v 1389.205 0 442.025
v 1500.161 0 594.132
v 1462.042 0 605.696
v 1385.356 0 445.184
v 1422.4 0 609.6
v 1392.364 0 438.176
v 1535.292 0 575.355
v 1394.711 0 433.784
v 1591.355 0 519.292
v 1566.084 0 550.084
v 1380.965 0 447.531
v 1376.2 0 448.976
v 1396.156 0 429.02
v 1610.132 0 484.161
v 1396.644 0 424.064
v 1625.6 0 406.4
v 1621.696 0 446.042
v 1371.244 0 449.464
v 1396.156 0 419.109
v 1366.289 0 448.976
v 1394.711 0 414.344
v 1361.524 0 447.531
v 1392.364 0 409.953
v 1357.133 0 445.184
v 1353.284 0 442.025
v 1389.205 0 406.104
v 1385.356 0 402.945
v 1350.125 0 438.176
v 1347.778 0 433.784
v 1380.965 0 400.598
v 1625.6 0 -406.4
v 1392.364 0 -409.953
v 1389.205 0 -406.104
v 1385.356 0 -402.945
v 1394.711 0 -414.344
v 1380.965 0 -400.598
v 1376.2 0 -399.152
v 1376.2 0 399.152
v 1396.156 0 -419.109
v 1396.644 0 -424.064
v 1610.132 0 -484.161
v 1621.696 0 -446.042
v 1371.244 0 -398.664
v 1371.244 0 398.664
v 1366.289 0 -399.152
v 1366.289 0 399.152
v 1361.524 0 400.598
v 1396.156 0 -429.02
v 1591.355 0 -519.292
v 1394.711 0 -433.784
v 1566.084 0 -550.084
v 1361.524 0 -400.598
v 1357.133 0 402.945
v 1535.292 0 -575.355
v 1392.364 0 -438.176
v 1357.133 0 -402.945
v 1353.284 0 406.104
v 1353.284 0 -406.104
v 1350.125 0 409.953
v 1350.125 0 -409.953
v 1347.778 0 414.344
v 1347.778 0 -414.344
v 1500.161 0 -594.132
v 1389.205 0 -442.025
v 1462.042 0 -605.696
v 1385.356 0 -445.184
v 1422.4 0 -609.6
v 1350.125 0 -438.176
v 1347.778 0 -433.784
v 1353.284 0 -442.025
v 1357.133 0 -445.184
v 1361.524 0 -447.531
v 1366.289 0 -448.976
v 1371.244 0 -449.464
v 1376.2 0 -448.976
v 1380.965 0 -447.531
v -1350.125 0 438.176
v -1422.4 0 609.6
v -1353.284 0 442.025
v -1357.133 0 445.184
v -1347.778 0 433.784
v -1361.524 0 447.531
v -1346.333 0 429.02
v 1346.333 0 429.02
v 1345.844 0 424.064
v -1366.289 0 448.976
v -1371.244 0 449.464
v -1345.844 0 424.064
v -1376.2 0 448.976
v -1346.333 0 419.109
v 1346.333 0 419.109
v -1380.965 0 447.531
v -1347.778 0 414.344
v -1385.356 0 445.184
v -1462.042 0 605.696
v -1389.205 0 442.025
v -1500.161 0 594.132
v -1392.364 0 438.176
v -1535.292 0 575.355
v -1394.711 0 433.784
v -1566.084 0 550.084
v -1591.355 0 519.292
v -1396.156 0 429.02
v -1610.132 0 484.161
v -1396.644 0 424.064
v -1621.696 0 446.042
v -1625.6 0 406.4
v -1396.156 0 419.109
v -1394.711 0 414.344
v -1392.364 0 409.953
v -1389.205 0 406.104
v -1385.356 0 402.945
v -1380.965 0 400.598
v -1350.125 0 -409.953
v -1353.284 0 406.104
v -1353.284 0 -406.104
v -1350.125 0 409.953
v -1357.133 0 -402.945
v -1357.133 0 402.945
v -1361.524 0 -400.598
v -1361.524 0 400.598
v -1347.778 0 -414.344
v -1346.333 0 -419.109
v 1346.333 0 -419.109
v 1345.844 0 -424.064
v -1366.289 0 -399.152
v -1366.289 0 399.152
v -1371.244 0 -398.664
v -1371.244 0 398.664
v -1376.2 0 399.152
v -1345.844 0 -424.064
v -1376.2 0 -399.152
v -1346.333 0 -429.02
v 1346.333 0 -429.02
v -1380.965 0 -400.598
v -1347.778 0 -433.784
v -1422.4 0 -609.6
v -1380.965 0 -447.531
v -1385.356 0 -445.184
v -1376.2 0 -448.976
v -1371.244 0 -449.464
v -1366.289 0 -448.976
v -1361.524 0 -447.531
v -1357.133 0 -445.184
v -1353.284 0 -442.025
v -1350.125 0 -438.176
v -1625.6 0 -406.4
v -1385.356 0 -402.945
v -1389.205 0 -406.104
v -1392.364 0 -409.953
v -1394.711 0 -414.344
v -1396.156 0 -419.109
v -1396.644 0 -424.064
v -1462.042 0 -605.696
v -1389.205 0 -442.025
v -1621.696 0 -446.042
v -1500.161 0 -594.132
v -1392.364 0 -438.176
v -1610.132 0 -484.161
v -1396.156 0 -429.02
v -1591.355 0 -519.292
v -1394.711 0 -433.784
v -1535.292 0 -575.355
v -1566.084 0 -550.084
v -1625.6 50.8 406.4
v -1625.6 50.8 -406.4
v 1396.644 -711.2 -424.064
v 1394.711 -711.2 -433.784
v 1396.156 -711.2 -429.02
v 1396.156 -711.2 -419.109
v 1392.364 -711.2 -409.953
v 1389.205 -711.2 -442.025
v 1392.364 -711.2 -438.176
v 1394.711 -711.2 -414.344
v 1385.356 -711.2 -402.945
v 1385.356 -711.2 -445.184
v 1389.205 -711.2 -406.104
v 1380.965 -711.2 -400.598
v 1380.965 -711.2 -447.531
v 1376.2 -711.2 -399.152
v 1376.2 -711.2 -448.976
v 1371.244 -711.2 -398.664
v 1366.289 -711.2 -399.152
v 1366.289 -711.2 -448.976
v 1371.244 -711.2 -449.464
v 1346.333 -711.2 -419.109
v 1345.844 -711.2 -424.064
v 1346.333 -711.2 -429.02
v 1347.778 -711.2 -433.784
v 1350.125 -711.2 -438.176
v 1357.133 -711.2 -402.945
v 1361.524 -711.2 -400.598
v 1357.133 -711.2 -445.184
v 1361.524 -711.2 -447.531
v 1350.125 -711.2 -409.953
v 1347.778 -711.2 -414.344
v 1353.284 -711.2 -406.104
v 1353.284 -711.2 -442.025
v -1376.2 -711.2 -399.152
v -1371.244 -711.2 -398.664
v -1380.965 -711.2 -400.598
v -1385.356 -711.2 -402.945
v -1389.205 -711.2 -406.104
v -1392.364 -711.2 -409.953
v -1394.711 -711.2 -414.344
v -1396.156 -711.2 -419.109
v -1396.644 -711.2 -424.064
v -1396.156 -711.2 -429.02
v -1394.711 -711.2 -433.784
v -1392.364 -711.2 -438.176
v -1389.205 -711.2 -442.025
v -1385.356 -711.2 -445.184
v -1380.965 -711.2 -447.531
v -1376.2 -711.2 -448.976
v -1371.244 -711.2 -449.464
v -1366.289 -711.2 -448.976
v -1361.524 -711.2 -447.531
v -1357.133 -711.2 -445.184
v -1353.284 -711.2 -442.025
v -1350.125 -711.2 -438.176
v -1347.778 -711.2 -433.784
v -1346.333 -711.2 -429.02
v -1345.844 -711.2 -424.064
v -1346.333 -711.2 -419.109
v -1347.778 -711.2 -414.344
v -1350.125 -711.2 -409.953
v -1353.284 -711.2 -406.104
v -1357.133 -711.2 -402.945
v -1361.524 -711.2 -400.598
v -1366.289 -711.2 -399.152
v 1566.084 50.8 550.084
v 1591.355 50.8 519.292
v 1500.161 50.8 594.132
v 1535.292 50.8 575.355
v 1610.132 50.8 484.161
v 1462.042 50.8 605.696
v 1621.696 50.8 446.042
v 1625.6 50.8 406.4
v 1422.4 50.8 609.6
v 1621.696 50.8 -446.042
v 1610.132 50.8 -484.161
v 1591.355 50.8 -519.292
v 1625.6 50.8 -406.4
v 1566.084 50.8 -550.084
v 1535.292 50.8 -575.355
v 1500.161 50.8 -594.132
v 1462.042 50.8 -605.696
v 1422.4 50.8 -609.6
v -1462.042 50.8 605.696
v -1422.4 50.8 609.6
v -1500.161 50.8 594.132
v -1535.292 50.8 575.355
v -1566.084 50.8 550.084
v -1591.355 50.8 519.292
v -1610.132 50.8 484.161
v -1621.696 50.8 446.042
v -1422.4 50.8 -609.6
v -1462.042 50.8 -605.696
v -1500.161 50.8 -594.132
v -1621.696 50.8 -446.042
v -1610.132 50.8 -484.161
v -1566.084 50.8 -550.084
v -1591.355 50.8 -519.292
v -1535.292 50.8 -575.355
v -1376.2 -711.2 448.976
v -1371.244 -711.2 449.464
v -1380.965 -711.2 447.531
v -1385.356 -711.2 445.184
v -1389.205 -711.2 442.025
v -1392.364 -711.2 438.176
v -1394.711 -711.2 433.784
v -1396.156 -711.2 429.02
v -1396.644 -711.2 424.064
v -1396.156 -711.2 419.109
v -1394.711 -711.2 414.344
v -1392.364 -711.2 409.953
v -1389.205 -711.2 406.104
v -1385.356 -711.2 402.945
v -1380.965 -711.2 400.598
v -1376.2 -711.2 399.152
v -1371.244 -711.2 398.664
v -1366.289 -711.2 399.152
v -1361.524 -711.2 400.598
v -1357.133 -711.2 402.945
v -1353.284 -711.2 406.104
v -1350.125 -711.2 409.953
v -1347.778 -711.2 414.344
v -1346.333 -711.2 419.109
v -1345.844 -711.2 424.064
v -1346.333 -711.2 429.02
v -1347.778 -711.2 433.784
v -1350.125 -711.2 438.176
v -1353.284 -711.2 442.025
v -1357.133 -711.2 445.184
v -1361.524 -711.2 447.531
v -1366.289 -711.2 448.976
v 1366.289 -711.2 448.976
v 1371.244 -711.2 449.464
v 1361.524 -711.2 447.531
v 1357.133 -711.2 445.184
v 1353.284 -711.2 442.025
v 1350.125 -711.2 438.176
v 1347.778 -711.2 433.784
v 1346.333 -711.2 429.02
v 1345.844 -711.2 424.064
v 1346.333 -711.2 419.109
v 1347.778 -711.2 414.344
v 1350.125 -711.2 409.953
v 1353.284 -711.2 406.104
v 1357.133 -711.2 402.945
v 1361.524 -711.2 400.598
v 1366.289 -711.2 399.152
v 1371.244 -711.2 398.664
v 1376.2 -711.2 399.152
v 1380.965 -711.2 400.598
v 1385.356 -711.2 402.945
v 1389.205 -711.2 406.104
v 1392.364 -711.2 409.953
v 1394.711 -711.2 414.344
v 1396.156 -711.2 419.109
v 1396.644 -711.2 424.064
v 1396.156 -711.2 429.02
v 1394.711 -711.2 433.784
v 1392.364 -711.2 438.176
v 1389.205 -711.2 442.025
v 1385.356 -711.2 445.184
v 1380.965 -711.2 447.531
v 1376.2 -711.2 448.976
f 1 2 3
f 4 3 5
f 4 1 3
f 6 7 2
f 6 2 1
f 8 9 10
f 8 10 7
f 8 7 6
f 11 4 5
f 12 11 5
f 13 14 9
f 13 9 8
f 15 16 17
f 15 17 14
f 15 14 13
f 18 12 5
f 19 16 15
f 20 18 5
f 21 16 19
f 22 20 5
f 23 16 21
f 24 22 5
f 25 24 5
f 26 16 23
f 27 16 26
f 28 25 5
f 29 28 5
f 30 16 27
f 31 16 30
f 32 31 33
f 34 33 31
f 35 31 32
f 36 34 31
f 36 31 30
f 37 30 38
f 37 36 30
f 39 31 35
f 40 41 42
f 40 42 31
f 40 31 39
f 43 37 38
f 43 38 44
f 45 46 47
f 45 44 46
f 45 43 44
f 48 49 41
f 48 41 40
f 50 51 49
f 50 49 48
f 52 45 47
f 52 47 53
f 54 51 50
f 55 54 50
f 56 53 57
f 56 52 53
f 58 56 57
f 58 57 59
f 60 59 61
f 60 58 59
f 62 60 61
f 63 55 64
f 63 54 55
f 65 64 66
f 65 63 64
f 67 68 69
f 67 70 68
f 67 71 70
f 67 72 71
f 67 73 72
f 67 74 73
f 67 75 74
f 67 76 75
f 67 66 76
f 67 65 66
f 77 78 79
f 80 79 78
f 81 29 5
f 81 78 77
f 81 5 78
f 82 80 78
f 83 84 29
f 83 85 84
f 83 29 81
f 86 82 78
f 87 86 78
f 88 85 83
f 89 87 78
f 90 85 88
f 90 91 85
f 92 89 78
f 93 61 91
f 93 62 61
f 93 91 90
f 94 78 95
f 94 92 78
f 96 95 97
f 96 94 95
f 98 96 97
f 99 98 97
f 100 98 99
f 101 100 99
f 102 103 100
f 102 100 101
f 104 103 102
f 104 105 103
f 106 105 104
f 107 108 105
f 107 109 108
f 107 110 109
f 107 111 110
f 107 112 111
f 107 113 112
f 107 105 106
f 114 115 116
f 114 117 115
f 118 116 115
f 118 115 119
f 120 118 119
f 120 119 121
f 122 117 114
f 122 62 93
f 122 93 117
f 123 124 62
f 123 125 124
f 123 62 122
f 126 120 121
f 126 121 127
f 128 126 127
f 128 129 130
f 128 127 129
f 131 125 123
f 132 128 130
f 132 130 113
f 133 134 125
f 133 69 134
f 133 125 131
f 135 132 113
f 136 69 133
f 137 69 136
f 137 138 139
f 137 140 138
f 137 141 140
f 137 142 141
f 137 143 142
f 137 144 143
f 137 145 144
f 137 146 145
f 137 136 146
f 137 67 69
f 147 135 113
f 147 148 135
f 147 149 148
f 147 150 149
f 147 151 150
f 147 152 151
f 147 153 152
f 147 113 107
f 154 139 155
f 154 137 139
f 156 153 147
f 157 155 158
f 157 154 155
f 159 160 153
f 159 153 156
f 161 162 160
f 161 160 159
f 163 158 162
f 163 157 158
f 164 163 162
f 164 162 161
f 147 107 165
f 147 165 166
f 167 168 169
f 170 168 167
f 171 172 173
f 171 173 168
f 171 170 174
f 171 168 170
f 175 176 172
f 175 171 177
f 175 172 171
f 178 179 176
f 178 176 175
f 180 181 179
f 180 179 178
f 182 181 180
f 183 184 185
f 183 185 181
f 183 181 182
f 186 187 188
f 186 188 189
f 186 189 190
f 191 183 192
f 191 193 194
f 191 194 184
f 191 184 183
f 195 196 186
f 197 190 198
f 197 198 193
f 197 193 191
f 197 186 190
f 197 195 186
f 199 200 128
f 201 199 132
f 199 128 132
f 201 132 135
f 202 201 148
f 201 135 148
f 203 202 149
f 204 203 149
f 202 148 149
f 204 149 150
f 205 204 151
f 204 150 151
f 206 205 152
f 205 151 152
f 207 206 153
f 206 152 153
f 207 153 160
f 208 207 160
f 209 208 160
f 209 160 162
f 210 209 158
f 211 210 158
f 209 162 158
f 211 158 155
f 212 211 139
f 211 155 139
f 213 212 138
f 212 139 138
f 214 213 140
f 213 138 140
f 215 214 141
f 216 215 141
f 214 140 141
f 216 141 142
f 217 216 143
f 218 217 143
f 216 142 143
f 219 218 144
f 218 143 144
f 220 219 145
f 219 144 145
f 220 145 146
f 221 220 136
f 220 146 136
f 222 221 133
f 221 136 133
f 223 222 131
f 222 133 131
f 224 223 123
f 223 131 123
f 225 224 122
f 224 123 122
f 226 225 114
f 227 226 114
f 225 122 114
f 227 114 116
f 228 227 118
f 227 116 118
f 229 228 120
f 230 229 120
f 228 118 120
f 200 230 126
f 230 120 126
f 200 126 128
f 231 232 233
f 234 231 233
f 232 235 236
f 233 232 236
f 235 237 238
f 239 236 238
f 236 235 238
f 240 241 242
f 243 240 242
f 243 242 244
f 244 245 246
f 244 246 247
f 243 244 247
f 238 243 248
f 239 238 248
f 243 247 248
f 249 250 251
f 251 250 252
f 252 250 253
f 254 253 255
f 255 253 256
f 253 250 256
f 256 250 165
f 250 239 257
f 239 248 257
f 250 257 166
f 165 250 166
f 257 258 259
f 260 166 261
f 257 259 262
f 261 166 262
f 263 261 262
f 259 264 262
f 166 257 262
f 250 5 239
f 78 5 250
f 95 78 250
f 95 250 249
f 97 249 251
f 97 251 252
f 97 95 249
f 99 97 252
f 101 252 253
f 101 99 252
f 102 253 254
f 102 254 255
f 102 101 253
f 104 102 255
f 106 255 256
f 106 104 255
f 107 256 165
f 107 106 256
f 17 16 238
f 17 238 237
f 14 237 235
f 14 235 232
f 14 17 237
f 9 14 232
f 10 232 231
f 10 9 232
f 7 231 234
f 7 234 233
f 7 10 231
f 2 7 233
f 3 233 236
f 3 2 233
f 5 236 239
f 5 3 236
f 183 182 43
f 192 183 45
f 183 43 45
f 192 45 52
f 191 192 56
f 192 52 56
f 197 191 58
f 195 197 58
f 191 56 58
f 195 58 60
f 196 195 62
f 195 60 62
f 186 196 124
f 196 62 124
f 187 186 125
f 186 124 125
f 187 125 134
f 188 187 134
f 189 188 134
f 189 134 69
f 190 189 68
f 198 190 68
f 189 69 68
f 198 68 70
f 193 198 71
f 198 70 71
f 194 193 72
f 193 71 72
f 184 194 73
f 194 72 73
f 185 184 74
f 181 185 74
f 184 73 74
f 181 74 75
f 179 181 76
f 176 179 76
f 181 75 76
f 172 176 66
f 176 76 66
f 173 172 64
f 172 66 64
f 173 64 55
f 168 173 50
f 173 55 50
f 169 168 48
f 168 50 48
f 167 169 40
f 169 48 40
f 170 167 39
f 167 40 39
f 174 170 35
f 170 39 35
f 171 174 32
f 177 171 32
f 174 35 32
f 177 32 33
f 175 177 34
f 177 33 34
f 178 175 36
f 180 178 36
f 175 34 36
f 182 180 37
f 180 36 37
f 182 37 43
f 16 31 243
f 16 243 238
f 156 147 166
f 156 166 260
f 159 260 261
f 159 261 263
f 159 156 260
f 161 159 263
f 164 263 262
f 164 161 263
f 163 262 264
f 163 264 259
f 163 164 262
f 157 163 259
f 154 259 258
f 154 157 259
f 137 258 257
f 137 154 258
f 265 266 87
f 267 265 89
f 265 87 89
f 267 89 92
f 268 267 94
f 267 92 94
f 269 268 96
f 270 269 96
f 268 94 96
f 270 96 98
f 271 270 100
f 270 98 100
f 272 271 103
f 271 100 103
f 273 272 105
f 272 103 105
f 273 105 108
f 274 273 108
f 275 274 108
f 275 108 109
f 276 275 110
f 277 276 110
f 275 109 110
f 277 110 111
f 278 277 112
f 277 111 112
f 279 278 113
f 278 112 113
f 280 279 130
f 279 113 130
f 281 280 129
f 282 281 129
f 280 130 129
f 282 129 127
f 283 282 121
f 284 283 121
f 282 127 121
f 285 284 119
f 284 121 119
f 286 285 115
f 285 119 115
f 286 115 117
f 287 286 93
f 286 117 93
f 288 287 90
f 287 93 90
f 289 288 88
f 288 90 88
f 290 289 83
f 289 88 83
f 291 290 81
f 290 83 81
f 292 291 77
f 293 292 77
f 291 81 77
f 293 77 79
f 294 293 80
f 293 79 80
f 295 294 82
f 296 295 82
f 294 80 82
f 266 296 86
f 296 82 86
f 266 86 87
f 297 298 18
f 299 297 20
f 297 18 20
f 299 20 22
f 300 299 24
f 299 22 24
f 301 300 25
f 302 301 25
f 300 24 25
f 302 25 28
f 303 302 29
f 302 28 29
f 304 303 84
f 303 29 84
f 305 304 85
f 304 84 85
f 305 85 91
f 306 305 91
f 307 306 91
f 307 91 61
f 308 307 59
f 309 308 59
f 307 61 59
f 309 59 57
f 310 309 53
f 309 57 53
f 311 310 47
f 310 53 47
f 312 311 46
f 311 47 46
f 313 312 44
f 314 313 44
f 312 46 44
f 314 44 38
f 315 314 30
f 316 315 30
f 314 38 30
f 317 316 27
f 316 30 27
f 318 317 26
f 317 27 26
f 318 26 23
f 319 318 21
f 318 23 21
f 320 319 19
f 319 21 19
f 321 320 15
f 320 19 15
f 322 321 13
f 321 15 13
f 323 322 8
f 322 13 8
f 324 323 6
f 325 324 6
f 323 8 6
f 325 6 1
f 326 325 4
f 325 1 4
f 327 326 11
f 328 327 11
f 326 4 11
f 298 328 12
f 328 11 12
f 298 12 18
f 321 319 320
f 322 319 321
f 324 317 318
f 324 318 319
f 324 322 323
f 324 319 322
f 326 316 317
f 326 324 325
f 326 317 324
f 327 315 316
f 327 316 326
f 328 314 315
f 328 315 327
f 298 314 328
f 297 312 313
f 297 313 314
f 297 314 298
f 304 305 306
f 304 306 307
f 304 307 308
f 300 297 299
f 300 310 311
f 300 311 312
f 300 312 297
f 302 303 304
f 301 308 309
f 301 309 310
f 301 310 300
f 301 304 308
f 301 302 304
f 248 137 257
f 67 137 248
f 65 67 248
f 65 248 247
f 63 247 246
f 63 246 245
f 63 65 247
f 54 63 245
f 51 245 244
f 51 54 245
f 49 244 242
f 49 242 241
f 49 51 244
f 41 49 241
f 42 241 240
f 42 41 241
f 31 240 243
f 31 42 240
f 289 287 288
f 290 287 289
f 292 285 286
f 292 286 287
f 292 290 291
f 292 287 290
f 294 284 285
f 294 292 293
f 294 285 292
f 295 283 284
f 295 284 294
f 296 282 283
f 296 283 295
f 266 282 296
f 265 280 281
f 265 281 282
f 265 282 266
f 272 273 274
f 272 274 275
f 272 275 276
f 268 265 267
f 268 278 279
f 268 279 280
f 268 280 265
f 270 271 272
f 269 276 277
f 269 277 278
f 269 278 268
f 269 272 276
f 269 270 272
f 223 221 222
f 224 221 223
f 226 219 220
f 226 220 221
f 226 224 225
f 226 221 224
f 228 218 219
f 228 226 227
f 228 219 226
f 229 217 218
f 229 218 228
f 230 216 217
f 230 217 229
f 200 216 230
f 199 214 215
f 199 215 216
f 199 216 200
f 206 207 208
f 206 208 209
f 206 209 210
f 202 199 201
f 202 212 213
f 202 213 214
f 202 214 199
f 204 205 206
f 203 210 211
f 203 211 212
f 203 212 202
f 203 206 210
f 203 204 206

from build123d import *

# Parameters (mm, degrees)
BOSS_EXTRUDE1_DEPTH = 50.8
SKETCH2_R           = 25.4
BOSS_EXTRUDE2_DEPTH = 711.2


with BuildPart() as part:
    # Sketch1 → Boss-Extrude1 (new body)
    with BuildSketch(Plane(origin=(0, 0, 0), x_dir=(1, 0, 0), z_dir=(0, 1, 0))):
        with BuildLine():
            Line((-1422.4, 609.6), (1422.4, 609.6))
            ThreePointArc((1422.4, 609.6), (1566.084097937, 550.084097937), (1625.6, 406.4))
            Line((1625.6, 406.4), (1625.6, -406.4))
            ThreePointArc((1625.6, -406.4), (1566.084097937, -550.084097937), (1422.4, -609.6))
            Line((1422.4, -609.6), (-1422.4, -609.6))
            ThreePointArc((-1422.4, -609.6), (-1566.084097937, -550.084097937), (-1625.6, -406.4))
            Line((-1625.6, -406.4), (-1625.6, 406.4))
            ThreePointArc((-1625.6, 406.4), (-1566.084097937, 550.084097937), (-1422.4, 609.6))
        make_face()
    extrude(amount=BOSS_EXTRUDE1_DEPTH)

    # Sketch2 → Boss-Extrude2 (add)
    with BuildSketch(Plane.XZ):
        with Locations(Location((-1371.244481687, 424.064320522, 0), (0, 0, 90))):
            Circle(SKETCH2_R)
        with Locations(Location((-1371.244481687, -424.064320522, 0), (0, 0, 90))):
            Circle(SKETCH2_R)
        with Locations(Location((1371.244481687, -424.064320522, 0), (0, 0, 90))):
            Circle(SKETCH2_R)
        with Locations(Location((1371.244481687, 424.064320522, 0), (0, 0, 90))):
            Circle(SKETCH2_R)
    extrude(amount=BOSS_EXTRUDE2_DEPTH)


solid = part.part
